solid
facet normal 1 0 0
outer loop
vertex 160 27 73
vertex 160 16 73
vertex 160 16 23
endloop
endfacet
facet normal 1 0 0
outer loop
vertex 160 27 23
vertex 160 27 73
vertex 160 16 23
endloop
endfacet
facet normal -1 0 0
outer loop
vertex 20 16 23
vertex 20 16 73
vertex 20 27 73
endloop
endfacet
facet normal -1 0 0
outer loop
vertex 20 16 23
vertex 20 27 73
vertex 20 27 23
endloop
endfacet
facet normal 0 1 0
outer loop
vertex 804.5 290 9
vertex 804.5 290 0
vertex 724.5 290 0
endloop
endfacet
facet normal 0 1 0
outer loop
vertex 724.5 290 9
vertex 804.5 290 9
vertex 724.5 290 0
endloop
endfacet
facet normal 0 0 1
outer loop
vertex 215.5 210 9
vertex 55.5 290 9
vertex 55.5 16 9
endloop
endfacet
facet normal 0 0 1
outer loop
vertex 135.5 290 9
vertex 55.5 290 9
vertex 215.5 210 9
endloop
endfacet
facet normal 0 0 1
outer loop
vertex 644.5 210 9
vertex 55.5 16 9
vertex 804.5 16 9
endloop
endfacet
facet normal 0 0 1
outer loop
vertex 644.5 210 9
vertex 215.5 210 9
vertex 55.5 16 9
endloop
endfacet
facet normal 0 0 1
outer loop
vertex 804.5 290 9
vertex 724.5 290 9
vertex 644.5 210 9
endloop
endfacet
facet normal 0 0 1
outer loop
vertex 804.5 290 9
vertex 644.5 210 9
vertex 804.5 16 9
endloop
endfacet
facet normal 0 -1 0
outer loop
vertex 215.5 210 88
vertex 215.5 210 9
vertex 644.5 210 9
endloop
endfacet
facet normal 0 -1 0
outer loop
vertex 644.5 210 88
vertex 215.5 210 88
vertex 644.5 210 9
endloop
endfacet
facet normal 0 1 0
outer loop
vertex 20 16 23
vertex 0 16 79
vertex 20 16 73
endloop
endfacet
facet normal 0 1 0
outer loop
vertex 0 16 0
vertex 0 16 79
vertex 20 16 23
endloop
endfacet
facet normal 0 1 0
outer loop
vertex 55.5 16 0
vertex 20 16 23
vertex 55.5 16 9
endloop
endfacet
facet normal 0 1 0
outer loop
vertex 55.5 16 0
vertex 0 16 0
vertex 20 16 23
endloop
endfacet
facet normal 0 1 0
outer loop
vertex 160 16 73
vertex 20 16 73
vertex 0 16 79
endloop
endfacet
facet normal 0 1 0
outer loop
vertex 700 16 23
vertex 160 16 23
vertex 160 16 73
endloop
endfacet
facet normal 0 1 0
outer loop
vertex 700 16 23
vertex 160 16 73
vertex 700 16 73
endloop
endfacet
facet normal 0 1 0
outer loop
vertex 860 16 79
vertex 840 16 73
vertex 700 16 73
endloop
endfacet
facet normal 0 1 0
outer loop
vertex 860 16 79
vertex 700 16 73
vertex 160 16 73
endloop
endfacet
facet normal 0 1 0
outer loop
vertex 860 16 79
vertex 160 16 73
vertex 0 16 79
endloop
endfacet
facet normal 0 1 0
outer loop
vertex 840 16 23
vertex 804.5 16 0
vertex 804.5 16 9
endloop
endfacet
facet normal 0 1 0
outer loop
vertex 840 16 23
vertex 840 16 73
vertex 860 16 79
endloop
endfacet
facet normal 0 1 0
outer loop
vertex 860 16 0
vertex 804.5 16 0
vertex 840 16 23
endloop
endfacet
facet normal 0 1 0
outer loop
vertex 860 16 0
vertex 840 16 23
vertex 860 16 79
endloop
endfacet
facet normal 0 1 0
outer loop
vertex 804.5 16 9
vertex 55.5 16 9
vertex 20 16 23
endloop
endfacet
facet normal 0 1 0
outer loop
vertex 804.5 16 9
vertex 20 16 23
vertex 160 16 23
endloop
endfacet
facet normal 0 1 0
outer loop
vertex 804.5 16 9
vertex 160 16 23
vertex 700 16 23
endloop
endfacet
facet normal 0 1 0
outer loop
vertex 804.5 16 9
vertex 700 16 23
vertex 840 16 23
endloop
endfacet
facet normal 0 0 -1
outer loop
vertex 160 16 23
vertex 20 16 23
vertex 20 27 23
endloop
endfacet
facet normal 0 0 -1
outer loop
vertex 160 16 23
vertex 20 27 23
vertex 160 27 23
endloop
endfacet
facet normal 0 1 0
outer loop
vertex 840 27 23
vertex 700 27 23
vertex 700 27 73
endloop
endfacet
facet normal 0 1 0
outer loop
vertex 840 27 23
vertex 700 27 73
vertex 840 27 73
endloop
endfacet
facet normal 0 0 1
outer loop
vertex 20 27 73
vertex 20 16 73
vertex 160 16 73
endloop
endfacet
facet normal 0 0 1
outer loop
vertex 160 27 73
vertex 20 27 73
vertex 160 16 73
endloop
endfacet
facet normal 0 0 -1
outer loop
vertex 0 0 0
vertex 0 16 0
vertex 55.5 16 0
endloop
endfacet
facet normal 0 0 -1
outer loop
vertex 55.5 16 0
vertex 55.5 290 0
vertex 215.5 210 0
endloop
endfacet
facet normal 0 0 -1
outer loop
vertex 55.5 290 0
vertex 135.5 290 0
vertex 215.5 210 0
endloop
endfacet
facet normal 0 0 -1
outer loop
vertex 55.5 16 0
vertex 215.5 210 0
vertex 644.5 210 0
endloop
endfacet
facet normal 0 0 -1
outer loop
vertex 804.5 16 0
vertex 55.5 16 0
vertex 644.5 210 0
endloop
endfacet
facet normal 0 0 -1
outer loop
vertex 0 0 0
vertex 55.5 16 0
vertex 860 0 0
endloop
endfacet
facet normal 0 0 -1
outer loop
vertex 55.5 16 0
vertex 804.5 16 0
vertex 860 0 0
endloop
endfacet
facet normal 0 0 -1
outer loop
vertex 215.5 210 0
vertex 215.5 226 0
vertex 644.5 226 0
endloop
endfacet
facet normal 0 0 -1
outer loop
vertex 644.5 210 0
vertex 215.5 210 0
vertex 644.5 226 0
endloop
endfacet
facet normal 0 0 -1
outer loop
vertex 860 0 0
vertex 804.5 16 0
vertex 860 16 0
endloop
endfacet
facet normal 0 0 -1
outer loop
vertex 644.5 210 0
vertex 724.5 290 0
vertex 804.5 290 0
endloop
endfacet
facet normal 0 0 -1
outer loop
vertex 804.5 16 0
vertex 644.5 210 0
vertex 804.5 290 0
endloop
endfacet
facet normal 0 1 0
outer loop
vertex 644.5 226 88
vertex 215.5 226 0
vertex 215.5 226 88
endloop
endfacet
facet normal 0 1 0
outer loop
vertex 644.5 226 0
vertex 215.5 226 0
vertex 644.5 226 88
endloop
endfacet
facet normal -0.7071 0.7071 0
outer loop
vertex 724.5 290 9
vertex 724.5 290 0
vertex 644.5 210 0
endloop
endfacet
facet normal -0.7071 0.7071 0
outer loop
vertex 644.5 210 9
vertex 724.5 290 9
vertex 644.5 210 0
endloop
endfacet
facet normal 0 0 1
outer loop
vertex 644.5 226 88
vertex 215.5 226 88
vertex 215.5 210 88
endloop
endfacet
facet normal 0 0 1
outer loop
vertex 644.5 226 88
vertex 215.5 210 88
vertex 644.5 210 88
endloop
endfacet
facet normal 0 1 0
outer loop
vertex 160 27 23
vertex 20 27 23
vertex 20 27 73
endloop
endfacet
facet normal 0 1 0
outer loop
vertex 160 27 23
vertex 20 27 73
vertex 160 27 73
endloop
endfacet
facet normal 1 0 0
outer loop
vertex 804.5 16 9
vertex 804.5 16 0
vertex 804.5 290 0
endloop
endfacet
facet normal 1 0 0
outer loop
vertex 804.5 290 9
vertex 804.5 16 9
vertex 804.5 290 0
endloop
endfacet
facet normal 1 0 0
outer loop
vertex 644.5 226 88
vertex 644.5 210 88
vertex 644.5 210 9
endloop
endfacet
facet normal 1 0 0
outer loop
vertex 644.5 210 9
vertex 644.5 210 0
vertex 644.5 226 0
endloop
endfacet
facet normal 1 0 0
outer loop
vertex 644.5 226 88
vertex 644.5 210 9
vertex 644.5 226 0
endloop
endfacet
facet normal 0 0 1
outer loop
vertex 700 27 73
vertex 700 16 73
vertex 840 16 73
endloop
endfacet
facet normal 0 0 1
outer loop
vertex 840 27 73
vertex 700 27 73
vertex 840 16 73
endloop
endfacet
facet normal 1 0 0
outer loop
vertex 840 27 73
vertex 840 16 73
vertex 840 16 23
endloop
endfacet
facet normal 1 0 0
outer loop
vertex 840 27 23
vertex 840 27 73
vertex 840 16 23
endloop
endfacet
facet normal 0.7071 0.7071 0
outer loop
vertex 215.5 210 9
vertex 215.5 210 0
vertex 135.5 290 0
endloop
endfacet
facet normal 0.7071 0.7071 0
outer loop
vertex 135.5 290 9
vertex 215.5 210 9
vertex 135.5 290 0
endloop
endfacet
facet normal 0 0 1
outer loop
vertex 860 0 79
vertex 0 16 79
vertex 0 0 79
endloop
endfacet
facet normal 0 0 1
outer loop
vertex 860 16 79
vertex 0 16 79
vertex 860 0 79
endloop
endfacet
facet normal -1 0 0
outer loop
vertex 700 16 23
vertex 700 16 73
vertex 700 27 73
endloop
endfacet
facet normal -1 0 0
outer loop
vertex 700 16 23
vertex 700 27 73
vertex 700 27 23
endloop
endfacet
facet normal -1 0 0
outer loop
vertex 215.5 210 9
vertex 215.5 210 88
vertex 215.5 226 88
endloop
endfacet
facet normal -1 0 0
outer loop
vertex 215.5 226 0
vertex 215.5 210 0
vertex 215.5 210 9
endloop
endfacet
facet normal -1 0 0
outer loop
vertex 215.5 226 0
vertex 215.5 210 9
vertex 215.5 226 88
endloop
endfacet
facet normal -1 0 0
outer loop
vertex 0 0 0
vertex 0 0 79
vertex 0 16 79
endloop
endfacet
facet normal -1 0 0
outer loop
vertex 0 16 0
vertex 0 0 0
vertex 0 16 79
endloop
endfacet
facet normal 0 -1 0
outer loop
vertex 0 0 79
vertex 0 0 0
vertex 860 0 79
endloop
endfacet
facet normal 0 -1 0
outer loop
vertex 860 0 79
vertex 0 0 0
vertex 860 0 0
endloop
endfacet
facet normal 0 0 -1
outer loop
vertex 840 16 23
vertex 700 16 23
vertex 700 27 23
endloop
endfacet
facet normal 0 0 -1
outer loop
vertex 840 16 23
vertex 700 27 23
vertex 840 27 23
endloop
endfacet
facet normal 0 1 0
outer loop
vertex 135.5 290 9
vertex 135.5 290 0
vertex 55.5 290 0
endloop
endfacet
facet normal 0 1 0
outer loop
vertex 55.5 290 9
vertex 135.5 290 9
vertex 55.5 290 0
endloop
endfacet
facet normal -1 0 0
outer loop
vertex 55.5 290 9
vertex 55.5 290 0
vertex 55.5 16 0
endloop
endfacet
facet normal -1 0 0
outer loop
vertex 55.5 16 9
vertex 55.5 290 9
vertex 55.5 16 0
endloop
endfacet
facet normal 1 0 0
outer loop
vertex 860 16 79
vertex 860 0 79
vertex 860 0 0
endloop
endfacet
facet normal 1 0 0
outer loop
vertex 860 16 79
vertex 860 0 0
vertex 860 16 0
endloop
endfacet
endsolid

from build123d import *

# Parameters (mm, degrees)
SKETCH_1_R             = 13
EXTRUDE_2_DEPTH        = 9
SKETCH_3_W             = 860
SKETCH_3_H             = 16
EXTRUDE_3_DEPTH        = 70
SKETCH_4_W             = 140
SKETCH_4_H             = 50
EXTRUDE_5_DEPTH        = 11
SKETCH_5_R             = 13
CUT_EXTRUDE_2_DEPTH    = 903.779042734
PATTERN_LINEAR_1_COUNT = 2
PATTERN_LINEAR_1_PITCH = 80
SKETCH_6_W             = 140
SKETCH_6_H             = 50
EXTRUDE_6_DEPTH        = 6
SKETCH_7_R             = 13
CUT_EXTRUDE_3_DEPTH    = 905.248306606
PATTERN_LINEAR_2_COUNT = 2
PATTERN_LINEAR_2_PITCH = 80
SKETCH_10_W            = 429
SKETCH_10_H            = 16
EXTRUDE_8_DEPTH        = 79
EXTRUDE_9_DEPTH        = 9
SKETCH_12_W            = 140
SKETCH_12_H            = 50
EXTRUDE_10_DEPTH       = 27


with BuildPart() as part:
    # 草图1 → 凸台-拉伸2 (new body)
    with BuildSketch(Plane.XY):
        Polygon((0, 0), (860, 0), (860, 16), (804.5, 16), (804.5, 290), (724.5, 290), (644.5, 210), (644.5, 226), (215.5, 226), (215.5, 210), (135.5, 290), (55.5, 290), (55.5, 16), (0, 16), align=None)
        with Locations((95.5, 90)):
            Circle(SKETCH_1_R, mode=Mode.SUBTRACT)
        with Locations((95.5, 170)):
            Circle(SKETCH_1_R, mode=Mode.SUBTRACT)
        with Locations((95.5, 250)):
            Circle(SKETCH_1_R, mode=Mode.SUBTRACT)
        with Locations((764.5, 90)):
            Circle(SKETCH_1_R, mode=Mode.SUBTRACT)
        with Locations((764.5, 170)):
            Circle(SKETCH_1_R, mode=Mode.SUBTRACT)
        with Locations((764.5, 250)):
            Circle(SKETCH_1_R, mode=Mode.SUBTRACT)
    extrude(amount=EXTRUDE_2_DEPTH)

    # 草图3 → 凸台-拉伸3 (add)
    with BuildSketch(Plane.XY.offset(9)):
        with Locations((430, 8)):
            Rectangle(SKETCH_3_W, SKETCH_3_H)
    extrude(amount=EXTRUDE_3_DEPTH)

    # 草图4 → 凸台-拉伸5 (add)
    with BuildSketch(Plane(origin=(0, 16, 0), x_dir=(1, 0, 0), z_dir=(0, 1, 0))):
        with Locations((90, -48)):
            Rectangle(SKETCH_4_W, SKETCH_4_H)
    extrude(amount=EXTRUDE_5_DEPTH)

    # 草图5 → 切除-拉伸2 (cut, through all)
    with BuildSketch(Plane(origin=(0, 27, 0), x_dir=(1, 0, 0), z_dir=(0, 1, 0))):
        with Locations(Location((40, -48, 0), (0, 0, 270))):
            Circle(SKETCH_5_R)
    cut_extrude_2 = extrude(amount=-CUT_EXTRUDE_2_DEPTH, mode=Mode.SUBTRACT)

    # 阵列(线性)1: 切除-拉伸2 ×2
    with Locations(*[(i * PATTERN_LINEAR_1_PITCH, 0, 0) for i in range(1, PATTERN_LINEAR_1_COUNT)]):
        add(cut_extrude_2, mode=Mode.SUBTRACT)

    # 草图6 → 凸台-拉伸6 (add)
    with BuildSketch(Plane(origin=(0, 16, 0), x_dir=(1, 0, 0), z_dir=(0, 1, 0))):
        with Locations((770, -48)):
            Rectangle(SKETCH_6_W, SKETCH_6_H)
    extrude(amount=EXTRUDE_6_DEPTH)

    # 草图7 → 切除-拉伸3 (cut, through all)
    with BuildSketch(Plane(origin=(0, 22, 0), x_dir=(1, 0, 0), z_dir=(0, 1, 0))):
        with Locations(Location((820, -48, 0), (0, 0, 270))):
            Circle(SKETCH_7_R)
    cut_extrude_3 = extrude(amount=-CUT_EXTRUDE_3_DEPTH, mode=Mode.SUBTRACT)

    # 阵列(线性)2: 切除-拉伸3 ×2
    with Locations(*[(-i * PATTERN_LINEAR_2_PITCH, 0, 0) for i in range(1, PATTERN_LINEAR_2_COUNT)]):
        add(cut_extrude_3, mode=Mode.SUBTRACT)

    # 草图10 → 凸台-拉伸8 (add)
    with BuildSketch(Plane.XY.offset(9)):
        with Locations((430, 218)):
            Rectangle(SKETCH_10_W, SKETCH_10_H)
    extrude(amount=EXTRUDE_8_DEPTH)

    # 草图11 → 凸台-拉伸9 (add)
    with BuildSketch(Plane.XY.offset(9)):
        Polygon((55.5, 290), (135.5, 290), (215.5, 210), (644.5, 210), (724.5, 290), (804.5, 290), (804.5, 16), (55.5, 16), align=None)
    extrude(amount=-EXTRUDE_9_DEPTH)

    # 草图12 → 凸台-拉伸10 (add)
    with BuildSketch(Plane(origin=(0, 27, 0), x_dir=(1, 0, 0), z_dir=(0, 1, 0))):
        with Locations((90, -48)):
            Rectangle(SKETCH_12_W, SKETCH_12_H)
        with Locations((770, -48)):
            Rectangle(SKETCH_12_W, SKETCH_12_H)
    extrude(amount=-EXTRUDE_10_DEPTH)


solid = part.part
